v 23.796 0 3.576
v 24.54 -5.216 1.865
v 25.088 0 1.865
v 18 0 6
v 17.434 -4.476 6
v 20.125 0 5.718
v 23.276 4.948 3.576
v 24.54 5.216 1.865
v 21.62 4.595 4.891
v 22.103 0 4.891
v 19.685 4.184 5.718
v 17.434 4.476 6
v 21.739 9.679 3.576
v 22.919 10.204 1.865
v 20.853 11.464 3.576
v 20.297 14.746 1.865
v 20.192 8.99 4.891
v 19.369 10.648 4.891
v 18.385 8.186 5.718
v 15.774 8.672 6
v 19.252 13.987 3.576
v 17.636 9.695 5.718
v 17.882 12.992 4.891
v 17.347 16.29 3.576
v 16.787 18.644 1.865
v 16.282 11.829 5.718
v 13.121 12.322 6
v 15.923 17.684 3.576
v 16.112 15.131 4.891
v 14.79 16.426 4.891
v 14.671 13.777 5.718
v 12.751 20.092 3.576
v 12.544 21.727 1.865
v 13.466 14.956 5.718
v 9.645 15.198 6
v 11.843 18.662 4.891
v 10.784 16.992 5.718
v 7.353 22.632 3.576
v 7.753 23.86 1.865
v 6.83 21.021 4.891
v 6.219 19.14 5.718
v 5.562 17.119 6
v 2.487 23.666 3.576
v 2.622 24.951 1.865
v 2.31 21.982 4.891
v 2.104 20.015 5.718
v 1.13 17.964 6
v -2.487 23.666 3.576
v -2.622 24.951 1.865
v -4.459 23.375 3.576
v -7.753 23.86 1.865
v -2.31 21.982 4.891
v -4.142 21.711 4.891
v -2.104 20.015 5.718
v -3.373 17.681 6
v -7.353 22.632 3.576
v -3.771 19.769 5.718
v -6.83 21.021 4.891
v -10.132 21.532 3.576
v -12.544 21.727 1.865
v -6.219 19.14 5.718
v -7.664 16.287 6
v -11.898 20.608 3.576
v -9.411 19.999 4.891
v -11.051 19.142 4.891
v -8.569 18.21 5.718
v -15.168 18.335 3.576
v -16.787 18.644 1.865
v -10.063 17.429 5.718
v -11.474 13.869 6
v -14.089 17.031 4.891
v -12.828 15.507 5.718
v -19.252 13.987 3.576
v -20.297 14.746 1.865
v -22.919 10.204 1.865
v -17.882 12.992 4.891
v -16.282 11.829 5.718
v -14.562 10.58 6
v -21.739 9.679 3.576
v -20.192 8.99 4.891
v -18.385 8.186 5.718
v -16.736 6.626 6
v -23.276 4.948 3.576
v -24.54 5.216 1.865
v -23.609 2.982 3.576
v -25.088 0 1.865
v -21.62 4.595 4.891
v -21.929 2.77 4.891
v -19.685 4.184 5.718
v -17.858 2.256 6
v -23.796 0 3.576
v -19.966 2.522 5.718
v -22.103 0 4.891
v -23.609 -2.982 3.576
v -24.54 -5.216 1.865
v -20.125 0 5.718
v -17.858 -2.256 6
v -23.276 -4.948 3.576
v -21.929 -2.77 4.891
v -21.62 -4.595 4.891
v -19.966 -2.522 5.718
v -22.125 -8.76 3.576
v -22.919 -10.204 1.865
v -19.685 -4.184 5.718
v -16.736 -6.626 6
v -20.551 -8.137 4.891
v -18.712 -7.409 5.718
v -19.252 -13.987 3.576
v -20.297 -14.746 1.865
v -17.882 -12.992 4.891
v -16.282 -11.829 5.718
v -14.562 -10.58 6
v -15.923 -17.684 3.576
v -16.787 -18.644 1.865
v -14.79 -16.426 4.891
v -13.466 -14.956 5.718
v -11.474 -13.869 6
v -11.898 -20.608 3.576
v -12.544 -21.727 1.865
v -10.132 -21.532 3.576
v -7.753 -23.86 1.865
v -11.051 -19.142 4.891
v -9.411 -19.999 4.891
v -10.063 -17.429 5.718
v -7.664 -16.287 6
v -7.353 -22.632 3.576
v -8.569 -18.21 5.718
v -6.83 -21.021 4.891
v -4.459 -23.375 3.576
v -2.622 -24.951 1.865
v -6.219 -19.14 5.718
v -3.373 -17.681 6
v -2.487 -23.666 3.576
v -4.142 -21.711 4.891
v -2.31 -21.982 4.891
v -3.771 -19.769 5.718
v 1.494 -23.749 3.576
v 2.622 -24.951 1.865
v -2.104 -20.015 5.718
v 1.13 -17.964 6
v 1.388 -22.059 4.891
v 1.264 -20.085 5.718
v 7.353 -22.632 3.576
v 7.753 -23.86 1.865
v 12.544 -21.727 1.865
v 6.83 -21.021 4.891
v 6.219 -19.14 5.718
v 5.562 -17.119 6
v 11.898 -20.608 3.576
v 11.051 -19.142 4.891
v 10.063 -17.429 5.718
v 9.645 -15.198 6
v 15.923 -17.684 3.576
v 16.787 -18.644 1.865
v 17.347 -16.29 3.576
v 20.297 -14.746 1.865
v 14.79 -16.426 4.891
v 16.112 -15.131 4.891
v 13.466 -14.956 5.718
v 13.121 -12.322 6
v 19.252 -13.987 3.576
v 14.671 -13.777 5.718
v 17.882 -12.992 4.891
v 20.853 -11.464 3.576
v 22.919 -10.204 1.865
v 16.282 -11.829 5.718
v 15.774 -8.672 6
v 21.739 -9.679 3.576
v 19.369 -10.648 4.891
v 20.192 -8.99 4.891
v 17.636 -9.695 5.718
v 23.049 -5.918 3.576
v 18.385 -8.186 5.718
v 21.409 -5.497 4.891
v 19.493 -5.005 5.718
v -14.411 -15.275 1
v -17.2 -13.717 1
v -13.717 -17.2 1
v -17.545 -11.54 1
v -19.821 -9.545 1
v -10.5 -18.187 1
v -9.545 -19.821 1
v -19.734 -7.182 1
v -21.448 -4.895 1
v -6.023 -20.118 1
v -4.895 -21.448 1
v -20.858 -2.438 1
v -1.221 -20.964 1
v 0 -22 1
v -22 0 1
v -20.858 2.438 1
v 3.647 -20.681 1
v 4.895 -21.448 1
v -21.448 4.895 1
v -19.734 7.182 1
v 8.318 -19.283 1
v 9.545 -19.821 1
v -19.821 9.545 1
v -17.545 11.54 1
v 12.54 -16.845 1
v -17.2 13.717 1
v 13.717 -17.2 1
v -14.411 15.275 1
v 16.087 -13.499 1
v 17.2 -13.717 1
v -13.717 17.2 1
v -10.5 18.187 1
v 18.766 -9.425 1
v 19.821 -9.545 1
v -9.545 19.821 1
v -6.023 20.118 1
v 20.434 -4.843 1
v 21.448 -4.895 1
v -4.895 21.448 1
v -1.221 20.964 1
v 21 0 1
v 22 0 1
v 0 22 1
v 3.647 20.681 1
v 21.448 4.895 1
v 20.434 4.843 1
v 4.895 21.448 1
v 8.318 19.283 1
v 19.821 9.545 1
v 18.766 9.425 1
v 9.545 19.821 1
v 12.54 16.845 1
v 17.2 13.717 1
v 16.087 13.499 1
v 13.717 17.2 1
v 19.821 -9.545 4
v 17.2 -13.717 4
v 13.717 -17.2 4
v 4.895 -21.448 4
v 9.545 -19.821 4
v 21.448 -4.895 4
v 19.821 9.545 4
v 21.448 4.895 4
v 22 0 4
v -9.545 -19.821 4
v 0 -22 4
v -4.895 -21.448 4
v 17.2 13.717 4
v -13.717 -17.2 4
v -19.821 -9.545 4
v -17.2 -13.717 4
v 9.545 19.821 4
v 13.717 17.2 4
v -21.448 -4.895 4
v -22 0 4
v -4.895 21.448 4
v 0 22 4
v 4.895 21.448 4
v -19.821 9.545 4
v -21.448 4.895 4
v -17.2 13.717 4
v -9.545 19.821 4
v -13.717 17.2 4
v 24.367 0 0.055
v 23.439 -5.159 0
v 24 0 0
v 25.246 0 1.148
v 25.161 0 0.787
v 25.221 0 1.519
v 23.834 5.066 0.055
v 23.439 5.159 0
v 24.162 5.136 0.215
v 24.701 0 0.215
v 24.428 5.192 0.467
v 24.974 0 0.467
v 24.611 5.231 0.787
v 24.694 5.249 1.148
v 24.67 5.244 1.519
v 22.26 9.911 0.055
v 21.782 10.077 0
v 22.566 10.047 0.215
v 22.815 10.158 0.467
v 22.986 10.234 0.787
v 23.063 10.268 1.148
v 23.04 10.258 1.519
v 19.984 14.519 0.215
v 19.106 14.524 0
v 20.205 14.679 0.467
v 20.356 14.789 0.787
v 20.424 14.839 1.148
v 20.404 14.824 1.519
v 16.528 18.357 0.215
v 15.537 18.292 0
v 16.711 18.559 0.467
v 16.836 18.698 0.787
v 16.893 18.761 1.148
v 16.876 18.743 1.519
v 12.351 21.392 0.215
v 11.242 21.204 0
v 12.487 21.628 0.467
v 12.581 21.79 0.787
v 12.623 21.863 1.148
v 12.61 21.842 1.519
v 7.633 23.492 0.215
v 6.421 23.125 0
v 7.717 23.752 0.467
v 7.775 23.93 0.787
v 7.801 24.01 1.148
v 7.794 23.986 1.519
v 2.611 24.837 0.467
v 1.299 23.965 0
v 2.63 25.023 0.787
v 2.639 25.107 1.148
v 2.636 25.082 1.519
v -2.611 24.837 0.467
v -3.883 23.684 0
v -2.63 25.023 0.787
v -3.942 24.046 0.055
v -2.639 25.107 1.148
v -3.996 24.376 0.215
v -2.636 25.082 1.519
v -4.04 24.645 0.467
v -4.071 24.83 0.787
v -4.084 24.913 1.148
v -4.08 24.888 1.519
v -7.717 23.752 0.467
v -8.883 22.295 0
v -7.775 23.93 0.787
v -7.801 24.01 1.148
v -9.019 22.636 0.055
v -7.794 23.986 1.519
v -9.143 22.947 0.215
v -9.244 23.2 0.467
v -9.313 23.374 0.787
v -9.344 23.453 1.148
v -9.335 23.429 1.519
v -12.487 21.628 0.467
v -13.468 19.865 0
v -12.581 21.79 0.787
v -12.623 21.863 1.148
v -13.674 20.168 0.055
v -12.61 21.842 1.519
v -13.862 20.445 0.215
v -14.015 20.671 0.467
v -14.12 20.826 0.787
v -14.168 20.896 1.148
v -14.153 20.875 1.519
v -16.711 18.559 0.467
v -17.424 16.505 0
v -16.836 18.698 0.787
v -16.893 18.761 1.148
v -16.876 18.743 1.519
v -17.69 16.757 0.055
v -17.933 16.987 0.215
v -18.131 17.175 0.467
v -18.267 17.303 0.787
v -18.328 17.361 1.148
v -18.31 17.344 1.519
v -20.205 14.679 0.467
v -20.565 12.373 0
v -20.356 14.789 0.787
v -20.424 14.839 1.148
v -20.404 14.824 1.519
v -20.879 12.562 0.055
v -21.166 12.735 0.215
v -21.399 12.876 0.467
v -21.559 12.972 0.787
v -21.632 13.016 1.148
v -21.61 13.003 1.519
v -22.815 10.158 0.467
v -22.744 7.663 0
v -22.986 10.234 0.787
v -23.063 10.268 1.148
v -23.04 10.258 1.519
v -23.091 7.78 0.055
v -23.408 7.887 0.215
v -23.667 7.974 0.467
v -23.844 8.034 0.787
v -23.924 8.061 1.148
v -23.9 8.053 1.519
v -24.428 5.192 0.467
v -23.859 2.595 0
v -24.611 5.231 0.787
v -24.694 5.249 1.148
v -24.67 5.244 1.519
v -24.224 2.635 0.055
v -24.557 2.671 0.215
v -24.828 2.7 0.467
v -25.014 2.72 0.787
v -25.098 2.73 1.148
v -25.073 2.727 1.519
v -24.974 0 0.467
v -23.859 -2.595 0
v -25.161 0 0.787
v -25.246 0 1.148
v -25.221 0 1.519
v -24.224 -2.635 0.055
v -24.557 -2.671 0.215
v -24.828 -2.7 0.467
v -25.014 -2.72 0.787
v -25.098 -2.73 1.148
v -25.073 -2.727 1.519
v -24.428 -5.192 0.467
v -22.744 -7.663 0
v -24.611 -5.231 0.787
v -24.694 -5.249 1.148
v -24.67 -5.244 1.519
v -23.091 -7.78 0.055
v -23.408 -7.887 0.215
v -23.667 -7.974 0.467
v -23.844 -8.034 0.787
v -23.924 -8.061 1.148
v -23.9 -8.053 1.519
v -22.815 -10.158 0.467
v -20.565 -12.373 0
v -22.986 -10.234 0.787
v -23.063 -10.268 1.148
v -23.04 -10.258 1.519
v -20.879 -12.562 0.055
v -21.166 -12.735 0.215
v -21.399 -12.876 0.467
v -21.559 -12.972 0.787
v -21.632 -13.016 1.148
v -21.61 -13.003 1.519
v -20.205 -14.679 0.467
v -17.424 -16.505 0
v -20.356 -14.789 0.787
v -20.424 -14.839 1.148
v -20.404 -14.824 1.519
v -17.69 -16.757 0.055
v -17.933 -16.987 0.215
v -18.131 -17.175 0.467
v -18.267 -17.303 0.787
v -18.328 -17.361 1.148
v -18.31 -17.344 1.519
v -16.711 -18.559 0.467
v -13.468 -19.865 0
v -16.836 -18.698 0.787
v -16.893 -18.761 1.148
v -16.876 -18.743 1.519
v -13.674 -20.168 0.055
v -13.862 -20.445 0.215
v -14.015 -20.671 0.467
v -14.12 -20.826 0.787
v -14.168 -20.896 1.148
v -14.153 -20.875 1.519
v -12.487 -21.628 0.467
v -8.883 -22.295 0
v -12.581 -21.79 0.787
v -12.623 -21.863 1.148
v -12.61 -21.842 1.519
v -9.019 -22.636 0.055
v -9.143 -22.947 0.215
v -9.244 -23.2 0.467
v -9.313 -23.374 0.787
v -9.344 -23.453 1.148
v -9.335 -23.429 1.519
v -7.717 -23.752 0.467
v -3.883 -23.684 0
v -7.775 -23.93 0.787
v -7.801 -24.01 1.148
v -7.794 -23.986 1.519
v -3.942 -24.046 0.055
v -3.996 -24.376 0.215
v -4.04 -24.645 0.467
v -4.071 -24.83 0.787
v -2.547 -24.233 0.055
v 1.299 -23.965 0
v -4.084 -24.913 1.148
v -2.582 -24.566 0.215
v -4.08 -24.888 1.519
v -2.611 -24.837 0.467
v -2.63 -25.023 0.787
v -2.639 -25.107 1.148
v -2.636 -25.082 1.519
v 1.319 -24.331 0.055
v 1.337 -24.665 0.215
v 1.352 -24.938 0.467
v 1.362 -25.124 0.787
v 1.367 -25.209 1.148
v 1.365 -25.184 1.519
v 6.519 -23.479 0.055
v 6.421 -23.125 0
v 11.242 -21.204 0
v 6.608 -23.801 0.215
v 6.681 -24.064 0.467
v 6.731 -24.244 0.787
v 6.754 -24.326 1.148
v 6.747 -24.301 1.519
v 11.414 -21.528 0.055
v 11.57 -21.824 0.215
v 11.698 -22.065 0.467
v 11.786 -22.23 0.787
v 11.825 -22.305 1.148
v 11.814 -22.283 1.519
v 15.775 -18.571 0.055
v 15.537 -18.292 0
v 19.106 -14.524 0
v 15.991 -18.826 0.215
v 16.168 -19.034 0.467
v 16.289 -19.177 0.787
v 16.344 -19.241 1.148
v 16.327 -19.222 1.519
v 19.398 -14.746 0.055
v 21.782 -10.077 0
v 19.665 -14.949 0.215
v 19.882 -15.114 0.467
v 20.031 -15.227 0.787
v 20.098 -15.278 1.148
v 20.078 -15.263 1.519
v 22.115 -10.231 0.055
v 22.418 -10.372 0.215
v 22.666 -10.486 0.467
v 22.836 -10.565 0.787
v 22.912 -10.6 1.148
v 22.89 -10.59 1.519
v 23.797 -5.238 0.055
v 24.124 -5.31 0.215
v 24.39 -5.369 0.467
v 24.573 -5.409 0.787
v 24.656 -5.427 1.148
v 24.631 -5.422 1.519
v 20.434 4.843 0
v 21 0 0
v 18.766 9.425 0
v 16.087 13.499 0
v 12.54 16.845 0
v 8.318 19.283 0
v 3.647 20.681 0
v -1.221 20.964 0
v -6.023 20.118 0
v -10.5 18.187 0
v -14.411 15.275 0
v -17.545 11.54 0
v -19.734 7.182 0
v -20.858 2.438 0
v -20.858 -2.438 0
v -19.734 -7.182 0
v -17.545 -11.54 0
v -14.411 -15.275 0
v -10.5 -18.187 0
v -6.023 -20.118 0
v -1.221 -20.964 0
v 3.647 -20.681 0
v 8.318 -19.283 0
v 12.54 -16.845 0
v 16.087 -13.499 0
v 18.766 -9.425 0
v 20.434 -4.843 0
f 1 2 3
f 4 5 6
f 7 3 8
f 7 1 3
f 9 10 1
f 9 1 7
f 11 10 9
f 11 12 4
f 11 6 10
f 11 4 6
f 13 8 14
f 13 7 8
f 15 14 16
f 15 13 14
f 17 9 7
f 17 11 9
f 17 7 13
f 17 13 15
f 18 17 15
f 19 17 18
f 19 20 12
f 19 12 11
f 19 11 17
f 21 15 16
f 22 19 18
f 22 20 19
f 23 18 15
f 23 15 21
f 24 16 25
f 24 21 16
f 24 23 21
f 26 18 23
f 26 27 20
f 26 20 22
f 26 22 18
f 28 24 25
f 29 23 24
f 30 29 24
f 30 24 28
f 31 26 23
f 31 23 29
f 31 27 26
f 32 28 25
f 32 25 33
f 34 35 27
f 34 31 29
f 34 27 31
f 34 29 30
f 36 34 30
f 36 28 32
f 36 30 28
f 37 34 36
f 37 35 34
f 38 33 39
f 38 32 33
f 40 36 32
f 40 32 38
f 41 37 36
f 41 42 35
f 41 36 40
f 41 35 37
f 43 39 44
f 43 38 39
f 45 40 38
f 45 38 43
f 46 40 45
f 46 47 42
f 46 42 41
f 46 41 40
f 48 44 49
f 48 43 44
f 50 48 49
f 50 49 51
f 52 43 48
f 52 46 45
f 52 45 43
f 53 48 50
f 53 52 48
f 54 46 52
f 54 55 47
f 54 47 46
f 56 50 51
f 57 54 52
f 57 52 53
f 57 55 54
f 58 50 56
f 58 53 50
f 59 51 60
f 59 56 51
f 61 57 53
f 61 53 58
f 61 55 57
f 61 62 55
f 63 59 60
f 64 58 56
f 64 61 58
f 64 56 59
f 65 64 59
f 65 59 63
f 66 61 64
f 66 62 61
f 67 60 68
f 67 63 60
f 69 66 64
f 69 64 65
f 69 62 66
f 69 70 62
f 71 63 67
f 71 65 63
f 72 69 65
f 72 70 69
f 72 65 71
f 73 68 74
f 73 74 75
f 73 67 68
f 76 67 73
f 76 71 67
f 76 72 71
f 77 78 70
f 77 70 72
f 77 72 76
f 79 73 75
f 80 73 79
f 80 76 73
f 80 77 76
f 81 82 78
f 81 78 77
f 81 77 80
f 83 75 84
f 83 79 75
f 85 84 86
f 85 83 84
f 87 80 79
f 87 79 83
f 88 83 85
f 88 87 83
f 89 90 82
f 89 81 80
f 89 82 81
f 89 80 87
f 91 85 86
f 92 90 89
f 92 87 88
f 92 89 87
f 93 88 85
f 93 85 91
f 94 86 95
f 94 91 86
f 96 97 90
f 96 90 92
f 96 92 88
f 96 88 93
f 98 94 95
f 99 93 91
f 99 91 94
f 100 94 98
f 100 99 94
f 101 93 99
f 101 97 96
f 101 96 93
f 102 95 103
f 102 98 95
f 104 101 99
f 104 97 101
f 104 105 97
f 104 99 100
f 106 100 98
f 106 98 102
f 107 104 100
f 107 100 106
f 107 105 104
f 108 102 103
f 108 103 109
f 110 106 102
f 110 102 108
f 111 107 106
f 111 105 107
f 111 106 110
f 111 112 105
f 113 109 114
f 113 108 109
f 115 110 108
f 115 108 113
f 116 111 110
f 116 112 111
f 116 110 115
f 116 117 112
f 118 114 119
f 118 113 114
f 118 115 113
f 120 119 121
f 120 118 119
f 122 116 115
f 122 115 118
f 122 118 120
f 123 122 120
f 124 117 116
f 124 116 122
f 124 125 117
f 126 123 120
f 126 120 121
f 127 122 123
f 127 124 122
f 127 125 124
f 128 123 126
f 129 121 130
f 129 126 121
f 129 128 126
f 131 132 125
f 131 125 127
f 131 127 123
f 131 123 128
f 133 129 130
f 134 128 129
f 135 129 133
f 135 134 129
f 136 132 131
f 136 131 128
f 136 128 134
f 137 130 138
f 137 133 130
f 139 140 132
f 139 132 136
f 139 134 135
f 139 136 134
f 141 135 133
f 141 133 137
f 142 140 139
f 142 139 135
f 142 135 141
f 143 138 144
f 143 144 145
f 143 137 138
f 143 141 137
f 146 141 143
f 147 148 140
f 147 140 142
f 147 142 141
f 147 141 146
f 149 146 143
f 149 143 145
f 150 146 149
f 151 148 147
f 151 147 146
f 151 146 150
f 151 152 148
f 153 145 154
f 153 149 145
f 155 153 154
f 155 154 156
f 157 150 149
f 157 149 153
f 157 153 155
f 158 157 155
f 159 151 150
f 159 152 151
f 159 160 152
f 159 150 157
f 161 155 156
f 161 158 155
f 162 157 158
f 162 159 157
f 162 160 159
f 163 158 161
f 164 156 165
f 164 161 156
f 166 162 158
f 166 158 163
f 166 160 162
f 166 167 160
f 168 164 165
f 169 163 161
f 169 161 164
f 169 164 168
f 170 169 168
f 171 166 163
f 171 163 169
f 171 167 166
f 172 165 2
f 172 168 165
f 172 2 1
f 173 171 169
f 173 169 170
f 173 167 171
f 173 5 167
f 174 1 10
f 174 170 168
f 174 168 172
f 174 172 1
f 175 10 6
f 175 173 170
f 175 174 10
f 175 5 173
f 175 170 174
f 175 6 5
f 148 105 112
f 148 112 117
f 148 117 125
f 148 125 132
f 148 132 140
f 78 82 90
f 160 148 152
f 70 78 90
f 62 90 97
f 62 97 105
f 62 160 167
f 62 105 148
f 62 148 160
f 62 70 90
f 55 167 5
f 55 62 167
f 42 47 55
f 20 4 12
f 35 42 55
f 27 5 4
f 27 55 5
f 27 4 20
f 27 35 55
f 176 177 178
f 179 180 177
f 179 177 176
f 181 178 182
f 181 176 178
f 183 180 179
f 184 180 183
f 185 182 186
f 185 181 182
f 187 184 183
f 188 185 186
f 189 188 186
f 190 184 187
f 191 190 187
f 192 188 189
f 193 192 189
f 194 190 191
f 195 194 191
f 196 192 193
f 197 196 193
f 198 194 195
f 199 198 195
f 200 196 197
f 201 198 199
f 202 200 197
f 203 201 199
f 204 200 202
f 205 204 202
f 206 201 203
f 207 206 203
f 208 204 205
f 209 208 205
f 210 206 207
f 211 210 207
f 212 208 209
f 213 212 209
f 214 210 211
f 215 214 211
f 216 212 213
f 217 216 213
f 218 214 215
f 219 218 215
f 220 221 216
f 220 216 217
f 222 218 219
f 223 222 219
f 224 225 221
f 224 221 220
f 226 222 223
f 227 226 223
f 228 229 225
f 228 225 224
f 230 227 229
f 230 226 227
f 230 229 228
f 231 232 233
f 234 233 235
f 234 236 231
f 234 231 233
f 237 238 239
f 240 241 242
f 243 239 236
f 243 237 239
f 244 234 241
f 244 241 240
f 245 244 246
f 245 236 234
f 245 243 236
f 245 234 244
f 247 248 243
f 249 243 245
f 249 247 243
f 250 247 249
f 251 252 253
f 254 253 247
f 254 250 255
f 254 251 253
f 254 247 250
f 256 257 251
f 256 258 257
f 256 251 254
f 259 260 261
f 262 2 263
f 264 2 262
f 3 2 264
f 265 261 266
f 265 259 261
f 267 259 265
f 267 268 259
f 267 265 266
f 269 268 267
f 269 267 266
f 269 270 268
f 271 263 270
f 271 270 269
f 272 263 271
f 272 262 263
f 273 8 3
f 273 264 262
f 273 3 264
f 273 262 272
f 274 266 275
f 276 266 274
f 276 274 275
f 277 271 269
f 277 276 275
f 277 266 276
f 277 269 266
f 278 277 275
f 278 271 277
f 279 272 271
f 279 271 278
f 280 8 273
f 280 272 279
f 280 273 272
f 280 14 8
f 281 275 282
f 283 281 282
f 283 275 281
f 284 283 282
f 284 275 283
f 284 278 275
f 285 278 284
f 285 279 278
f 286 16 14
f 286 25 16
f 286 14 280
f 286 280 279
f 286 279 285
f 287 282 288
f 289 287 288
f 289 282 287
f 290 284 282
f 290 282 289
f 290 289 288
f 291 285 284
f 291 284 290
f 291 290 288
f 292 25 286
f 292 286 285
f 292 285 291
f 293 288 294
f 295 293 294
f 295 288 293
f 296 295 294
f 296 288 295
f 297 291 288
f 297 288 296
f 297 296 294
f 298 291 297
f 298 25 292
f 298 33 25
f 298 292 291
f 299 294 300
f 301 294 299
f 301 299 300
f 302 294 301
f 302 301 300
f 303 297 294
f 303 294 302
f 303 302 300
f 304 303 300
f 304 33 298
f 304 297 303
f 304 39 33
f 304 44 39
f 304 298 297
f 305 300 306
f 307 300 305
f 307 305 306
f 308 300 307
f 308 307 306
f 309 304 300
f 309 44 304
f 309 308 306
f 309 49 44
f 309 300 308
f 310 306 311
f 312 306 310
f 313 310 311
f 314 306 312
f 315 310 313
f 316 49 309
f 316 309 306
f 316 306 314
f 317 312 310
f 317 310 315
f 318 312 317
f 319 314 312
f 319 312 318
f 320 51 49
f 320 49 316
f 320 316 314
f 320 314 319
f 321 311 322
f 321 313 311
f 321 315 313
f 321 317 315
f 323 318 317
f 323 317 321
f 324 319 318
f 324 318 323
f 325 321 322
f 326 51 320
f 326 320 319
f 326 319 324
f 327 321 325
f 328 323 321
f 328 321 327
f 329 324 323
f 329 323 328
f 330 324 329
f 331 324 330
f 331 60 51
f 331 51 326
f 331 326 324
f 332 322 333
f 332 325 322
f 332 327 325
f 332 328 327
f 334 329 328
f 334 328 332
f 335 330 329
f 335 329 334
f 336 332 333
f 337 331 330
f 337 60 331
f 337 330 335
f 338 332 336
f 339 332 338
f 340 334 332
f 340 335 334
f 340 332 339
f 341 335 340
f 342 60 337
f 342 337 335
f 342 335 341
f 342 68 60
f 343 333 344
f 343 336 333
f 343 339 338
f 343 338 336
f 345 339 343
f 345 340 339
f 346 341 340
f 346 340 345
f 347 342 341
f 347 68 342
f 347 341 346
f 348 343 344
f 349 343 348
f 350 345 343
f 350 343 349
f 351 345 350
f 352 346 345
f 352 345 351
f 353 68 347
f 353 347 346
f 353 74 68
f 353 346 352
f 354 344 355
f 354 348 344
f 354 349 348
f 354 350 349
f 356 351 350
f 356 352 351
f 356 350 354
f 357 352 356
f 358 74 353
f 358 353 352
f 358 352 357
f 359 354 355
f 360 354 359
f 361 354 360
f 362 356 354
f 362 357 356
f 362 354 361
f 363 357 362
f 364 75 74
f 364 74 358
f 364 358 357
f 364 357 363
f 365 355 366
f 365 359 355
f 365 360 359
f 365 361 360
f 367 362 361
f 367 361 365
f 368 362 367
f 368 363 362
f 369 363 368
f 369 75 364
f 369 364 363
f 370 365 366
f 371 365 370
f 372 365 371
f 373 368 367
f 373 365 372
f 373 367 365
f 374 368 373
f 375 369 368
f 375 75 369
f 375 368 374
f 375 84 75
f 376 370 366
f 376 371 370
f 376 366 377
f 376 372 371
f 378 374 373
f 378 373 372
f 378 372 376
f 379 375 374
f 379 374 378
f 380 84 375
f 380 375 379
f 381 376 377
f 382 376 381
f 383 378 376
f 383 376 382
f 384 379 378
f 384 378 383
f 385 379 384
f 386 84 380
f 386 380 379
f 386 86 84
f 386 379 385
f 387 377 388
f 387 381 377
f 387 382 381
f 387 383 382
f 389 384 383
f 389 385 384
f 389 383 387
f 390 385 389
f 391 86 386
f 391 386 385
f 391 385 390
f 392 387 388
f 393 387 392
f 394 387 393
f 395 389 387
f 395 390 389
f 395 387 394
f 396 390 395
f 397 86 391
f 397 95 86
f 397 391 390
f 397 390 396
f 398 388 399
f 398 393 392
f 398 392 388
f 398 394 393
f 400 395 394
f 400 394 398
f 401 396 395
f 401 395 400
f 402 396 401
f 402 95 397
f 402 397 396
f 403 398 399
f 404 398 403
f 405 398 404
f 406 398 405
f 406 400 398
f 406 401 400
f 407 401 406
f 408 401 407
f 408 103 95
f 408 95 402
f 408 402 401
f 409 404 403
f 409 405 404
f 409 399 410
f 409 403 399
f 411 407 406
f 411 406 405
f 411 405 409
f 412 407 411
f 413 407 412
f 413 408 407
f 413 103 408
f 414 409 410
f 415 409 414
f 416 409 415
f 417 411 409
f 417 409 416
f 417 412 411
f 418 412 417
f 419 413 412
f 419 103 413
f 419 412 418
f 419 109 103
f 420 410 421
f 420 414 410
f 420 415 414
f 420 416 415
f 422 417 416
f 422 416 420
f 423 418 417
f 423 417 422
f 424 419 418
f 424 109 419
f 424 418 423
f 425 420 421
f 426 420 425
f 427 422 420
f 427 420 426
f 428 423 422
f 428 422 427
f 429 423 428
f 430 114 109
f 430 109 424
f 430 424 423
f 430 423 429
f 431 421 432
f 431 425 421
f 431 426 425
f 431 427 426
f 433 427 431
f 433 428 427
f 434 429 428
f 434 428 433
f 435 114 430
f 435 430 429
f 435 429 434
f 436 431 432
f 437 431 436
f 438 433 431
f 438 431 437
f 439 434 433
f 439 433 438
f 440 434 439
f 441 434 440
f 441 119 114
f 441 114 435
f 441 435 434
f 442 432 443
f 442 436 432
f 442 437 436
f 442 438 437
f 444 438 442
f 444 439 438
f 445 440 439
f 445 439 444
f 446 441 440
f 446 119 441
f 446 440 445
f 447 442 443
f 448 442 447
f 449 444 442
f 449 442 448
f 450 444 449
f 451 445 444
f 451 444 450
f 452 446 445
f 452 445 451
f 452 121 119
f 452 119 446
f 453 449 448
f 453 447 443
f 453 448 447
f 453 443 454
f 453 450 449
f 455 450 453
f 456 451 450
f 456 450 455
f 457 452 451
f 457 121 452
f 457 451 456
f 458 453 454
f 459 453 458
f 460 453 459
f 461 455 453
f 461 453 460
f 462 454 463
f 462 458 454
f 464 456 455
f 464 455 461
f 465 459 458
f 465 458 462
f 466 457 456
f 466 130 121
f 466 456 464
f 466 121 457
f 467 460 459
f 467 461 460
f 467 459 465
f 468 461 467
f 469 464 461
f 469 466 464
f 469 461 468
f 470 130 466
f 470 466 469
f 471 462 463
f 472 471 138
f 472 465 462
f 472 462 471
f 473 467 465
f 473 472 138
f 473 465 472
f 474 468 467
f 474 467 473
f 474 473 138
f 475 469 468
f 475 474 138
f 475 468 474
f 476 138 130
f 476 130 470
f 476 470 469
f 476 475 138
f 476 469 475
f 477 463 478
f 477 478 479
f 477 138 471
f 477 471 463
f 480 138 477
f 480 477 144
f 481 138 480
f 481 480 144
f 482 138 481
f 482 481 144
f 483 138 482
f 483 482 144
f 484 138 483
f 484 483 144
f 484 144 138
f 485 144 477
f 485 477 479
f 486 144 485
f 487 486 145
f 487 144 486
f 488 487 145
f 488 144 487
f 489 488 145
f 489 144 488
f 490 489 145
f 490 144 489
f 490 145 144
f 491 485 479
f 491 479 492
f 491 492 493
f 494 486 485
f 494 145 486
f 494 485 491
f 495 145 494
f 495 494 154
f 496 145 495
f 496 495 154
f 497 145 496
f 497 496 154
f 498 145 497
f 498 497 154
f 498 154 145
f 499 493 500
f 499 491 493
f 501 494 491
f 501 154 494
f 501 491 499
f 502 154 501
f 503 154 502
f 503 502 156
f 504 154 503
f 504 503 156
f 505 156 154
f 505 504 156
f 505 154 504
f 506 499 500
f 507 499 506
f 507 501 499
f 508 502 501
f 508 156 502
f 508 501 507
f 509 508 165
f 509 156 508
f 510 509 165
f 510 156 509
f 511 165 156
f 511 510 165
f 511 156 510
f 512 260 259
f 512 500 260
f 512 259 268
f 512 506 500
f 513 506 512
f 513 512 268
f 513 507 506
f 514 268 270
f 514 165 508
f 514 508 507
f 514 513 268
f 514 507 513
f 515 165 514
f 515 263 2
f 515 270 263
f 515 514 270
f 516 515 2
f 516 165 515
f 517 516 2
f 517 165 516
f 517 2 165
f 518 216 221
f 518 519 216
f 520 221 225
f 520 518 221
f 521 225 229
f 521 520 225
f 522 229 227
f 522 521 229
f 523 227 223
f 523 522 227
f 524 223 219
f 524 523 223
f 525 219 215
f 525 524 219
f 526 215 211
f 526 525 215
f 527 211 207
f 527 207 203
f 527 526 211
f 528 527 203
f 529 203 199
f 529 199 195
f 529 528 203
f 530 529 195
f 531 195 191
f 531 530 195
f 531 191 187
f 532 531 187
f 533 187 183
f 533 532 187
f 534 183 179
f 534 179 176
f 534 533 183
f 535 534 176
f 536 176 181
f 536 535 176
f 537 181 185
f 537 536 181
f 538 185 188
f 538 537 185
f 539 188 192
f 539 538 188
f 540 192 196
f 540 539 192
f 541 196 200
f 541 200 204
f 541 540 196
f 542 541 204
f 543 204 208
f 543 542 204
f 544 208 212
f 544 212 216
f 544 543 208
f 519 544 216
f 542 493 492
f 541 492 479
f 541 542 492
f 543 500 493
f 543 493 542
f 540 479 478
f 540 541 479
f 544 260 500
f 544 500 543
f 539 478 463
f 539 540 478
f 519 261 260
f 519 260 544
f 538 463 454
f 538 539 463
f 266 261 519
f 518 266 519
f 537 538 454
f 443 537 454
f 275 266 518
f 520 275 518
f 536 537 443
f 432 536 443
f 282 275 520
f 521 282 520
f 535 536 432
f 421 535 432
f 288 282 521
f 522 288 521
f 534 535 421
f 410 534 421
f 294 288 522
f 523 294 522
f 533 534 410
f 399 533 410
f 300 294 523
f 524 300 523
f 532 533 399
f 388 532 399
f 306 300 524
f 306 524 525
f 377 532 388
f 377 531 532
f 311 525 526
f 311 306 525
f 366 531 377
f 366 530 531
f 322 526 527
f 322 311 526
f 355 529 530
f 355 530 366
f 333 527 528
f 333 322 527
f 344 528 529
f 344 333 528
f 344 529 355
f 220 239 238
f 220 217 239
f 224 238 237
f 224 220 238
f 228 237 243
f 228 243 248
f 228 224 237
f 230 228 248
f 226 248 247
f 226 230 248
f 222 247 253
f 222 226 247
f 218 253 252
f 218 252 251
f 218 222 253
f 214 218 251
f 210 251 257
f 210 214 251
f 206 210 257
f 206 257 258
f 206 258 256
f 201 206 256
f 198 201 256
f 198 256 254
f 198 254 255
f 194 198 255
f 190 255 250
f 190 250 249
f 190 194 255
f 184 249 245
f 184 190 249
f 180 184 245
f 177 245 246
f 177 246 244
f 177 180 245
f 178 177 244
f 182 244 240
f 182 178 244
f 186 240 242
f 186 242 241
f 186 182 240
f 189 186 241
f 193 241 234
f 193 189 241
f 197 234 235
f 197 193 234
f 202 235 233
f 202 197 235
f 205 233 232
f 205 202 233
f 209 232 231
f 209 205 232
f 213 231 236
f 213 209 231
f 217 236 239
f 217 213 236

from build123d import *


with BuildPart() as f1:
    # F0 (on Front) → F1 (revolve)
    with BuildSketch(Plane.XZ):
        with BuildLine():
            Line((21, 0), (24, 0))
            Line((24, 0), (24, 1.865))
            Line((24, 1.865), (25.088, 1.865))
            ThreePointArc((25.088, 1.865), (22.102986, 4.890684), (18, 6))
            Line((18, 6), (0, 6))
            Line((0, 6), (0, 4))
            Line((0, 4), (22, 4))
            Line((22, 4), (22, 1))
            Line((22, 1), (21, 1))
            Line((21, 1), (21, 0))
        make_face()
        with BuildLine():
            Line((24, 1.865), (24, 0))
            ThreePointArc((24, 0), (25.07958, 0.620055), (25.088, 1.865))
            Line((25.088, 1.865), (24, 1.865))
        make_face()
    revolve(axis=Axis((0, 0, 5), (0, 0, 1)))


solid = f1.part
